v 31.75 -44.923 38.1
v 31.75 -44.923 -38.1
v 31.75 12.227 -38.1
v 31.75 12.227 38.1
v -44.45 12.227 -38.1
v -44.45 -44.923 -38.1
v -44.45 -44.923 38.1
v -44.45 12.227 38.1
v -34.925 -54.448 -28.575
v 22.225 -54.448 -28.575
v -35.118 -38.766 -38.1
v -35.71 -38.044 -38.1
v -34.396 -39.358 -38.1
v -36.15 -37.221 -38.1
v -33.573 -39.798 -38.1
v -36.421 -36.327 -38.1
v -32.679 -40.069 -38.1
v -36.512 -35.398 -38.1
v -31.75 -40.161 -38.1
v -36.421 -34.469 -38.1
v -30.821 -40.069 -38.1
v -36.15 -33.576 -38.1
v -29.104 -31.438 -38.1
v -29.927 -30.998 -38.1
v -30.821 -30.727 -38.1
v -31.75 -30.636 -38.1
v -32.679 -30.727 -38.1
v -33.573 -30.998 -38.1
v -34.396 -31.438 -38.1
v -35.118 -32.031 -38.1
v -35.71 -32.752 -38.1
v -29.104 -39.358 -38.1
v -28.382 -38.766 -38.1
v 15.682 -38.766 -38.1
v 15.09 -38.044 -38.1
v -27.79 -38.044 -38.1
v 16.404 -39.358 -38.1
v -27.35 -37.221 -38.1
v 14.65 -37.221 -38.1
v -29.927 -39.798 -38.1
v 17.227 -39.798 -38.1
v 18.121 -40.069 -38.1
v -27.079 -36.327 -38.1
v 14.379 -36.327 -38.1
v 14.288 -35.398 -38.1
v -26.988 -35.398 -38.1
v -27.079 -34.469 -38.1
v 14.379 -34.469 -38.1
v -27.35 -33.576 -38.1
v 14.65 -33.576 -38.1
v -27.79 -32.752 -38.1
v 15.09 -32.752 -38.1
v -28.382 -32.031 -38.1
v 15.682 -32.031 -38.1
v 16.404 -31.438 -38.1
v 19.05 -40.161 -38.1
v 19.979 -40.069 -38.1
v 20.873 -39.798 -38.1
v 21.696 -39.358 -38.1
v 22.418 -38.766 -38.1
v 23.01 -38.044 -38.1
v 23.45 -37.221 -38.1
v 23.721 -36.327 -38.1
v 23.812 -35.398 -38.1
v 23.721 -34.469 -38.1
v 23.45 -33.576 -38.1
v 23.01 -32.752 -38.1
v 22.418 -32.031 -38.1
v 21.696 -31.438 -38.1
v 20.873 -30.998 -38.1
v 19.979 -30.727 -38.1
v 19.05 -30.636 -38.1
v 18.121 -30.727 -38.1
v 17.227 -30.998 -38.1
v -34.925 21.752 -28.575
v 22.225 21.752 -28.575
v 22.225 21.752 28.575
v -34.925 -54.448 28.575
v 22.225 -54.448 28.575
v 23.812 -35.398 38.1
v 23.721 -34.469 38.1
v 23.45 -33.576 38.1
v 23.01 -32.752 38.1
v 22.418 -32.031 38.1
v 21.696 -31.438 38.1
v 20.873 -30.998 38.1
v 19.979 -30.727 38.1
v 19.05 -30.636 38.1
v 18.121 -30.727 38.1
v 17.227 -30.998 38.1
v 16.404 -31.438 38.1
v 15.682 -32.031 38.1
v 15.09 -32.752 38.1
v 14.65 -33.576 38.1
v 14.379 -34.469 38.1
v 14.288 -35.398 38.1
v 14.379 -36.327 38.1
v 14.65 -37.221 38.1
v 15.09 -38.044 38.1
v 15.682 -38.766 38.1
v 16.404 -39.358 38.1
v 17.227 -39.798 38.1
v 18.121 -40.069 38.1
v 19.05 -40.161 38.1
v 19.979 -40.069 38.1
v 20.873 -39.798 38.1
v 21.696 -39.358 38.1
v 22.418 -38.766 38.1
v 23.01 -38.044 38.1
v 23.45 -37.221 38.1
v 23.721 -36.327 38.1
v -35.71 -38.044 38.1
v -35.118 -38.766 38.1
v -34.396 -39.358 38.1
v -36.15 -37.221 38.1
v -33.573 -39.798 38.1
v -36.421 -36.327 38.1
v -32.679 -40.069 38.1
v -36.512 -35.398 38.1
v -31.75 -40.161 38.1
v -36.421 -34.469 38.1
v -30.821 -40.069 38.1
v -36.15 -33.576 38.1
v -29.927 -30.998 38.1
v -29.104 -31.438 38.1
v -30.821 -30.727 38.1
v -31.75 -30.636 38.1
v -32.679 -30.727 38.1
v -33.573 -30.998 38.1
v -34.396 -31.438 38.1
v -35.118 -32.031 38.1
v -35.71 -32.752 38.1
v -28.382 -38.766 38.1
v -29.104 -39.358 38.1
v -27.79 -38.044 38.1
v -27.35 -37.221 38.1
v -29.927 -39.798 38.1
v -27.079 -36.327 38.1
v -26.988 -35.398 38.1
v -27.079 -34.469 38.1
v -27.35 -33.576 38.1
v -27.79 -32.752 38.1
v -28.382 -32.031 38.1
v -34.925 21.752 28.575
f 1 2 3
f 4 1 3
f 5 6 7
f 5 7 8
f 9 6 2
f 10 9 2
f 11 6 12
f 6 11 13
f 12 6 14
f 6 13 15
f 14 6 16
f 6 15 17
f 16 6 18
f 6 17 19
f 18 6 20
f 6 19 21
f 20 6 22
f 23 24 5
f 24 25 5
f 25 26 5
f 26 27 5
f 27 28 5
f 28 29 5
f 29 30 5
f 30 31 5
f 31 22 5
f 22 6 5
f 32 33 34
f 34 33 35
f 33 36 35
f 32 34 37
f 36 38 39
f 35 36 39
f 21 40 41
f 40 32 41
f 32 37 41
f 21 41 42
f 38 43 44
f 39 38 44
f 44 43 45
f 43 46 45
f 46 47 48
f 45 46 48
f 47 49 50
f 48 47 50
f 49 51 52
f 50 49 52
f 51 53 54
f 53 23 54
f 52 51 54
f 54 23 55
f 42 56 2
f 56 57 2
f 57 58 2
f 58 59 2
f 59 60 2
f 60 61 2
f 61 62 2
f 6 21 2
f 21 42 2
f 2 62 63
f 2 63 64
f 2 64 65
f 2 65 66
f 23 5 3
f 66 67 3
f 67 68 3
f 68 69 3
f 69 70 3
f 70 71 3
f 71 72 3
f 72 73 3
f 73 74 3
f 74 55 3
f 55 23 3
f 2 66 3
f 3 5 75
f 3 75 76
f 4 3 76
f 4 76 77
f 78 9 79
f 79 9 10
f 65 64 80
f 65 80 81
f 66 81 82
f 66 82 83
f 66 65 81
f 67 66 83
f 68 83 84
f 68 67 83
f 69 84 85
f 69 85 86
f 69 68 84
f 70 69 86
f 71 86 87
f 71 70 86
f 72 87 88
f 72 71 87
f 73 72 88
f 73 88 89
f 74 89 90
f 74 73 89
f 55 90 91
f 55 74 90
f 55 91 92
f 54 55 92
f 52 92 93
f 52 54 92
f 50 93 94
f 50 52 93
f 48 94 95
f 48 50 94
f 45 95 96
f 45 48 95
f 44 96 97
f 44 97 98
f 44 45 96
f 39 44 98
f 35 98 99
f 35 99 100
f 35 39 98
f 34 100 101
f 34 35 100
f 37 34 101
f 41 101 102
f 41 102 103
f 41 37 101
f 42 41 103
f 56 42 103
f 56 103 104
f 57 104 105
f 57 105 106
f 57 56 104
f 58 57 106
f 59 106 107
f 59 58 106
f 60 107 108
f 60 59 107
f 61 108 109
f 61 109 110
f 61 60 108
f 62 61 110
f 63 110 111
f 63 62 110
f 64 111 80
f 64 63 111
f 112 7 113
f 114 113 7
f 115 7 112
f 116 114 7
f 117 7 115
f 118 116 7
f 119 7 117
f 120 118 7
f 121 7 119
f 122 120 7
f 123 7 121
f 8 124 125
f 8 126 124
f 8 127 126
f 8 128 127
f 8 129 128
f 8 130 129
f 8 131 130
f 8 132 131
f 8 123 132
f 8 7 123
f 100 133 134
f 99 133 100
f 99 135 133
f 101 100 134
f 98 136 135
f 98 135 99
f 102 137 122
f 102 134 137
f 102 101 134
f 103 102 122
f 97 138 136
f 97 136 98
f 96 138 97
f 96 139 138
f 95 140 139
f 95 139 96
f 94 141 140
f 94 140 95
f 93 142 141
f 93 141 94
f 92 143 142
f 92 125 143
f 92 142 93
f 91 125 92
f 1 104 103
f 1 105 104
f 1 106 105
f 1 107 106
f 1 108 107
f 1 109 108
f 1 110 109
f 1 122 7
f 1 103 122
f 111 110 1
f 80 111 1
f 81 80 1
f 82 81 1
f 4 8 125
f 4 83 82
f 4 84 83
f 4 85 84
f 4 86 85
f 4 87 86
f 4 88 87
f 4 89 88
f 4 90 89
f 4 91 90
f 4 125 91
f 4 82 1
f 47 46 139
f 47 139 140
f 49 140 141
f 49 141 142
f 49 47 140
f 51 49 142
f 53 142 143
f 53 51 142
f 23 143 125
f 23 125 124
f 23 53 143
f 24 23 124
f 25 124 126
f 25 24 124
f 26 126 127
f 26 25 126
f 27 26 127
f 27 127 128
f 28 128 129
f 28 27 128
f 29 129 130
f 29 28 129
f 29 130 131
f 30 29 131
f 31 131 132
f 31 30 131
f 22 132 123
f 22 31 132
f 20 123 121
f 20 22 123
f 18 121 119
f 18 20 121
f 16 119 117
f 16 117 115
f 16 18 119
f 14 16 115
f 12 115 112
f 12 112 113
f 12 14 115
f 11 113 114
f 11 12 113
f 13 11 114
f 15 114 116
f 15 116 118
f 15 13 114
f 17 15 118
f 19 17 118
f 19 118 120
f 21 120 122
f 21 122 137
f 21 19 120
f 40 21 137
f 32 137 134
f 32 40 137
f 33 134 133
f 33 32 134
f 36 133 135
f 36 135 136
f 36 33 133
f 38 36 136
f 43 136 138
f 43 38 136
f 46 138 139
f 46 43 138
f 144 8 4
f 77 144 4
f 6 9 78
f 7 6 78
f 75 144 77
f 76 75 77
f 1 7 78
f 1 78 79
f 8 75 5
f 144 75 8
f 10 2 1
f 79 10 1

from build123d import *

# Parameters (mm, degrees)
BOSS_EXTRUDE1_DEPTH      = 38.1
BOSS_EXTRUDE1_DEPTH_BACK = 38.1
SKETCH1_W                = 76.2
SKETCH1_H                = 76.2
SKETCH1_R                = 4.7625
CHAMFER1_SIZE            = 9.525


with BuildPart() as part:
    # Sketch1 → Boss-Extrude1 (new, two sides: drawn at the far end of the back side and taken through both)
    with BuildSketch(Plane.XY.offset(-BOSS_EXTRUDE1_DEPTH_BACK)):
        with Locations((-6.35, -16.348197115)):
            Rectangle(SKETCH1_W, SKETCH1_H)
        with Locations((-31.75, -35.398197115)):
            Circle(SKETCH1_R, mode=Mode.SUBTRACT)
        with Locations((19.05, -35.398197115)):
            Circle(SKETCH1_R, mode=Mode.SUBTRACT)
    extrude(amount=BOSS_EXTRUDE1_DEPTH + BOSS_EXTRUDE1_DEPTH_BACK)

    # Chamfer1
    chamfer1_edges = [part.edges().sort_by_distance(p)[0] for p in [
        (-6.35, -54.448197115, -38.1),
        (-6.35, 21.751802885, 38.1),
        (-6.35, -54.448197115, 38.1),
        (31.75, -54.448197115, 0),
        (-44.45, -54.448197115, 0),
        (-44.45, 21.751802885, 0),
        (31.75, 21.751802885, 0),
        (-6.35, 21.751802885, -38.1),
    ]]
    chamfer(chamfer1_edges, length=CHAMFER1_SIZE)


solid = part.part
